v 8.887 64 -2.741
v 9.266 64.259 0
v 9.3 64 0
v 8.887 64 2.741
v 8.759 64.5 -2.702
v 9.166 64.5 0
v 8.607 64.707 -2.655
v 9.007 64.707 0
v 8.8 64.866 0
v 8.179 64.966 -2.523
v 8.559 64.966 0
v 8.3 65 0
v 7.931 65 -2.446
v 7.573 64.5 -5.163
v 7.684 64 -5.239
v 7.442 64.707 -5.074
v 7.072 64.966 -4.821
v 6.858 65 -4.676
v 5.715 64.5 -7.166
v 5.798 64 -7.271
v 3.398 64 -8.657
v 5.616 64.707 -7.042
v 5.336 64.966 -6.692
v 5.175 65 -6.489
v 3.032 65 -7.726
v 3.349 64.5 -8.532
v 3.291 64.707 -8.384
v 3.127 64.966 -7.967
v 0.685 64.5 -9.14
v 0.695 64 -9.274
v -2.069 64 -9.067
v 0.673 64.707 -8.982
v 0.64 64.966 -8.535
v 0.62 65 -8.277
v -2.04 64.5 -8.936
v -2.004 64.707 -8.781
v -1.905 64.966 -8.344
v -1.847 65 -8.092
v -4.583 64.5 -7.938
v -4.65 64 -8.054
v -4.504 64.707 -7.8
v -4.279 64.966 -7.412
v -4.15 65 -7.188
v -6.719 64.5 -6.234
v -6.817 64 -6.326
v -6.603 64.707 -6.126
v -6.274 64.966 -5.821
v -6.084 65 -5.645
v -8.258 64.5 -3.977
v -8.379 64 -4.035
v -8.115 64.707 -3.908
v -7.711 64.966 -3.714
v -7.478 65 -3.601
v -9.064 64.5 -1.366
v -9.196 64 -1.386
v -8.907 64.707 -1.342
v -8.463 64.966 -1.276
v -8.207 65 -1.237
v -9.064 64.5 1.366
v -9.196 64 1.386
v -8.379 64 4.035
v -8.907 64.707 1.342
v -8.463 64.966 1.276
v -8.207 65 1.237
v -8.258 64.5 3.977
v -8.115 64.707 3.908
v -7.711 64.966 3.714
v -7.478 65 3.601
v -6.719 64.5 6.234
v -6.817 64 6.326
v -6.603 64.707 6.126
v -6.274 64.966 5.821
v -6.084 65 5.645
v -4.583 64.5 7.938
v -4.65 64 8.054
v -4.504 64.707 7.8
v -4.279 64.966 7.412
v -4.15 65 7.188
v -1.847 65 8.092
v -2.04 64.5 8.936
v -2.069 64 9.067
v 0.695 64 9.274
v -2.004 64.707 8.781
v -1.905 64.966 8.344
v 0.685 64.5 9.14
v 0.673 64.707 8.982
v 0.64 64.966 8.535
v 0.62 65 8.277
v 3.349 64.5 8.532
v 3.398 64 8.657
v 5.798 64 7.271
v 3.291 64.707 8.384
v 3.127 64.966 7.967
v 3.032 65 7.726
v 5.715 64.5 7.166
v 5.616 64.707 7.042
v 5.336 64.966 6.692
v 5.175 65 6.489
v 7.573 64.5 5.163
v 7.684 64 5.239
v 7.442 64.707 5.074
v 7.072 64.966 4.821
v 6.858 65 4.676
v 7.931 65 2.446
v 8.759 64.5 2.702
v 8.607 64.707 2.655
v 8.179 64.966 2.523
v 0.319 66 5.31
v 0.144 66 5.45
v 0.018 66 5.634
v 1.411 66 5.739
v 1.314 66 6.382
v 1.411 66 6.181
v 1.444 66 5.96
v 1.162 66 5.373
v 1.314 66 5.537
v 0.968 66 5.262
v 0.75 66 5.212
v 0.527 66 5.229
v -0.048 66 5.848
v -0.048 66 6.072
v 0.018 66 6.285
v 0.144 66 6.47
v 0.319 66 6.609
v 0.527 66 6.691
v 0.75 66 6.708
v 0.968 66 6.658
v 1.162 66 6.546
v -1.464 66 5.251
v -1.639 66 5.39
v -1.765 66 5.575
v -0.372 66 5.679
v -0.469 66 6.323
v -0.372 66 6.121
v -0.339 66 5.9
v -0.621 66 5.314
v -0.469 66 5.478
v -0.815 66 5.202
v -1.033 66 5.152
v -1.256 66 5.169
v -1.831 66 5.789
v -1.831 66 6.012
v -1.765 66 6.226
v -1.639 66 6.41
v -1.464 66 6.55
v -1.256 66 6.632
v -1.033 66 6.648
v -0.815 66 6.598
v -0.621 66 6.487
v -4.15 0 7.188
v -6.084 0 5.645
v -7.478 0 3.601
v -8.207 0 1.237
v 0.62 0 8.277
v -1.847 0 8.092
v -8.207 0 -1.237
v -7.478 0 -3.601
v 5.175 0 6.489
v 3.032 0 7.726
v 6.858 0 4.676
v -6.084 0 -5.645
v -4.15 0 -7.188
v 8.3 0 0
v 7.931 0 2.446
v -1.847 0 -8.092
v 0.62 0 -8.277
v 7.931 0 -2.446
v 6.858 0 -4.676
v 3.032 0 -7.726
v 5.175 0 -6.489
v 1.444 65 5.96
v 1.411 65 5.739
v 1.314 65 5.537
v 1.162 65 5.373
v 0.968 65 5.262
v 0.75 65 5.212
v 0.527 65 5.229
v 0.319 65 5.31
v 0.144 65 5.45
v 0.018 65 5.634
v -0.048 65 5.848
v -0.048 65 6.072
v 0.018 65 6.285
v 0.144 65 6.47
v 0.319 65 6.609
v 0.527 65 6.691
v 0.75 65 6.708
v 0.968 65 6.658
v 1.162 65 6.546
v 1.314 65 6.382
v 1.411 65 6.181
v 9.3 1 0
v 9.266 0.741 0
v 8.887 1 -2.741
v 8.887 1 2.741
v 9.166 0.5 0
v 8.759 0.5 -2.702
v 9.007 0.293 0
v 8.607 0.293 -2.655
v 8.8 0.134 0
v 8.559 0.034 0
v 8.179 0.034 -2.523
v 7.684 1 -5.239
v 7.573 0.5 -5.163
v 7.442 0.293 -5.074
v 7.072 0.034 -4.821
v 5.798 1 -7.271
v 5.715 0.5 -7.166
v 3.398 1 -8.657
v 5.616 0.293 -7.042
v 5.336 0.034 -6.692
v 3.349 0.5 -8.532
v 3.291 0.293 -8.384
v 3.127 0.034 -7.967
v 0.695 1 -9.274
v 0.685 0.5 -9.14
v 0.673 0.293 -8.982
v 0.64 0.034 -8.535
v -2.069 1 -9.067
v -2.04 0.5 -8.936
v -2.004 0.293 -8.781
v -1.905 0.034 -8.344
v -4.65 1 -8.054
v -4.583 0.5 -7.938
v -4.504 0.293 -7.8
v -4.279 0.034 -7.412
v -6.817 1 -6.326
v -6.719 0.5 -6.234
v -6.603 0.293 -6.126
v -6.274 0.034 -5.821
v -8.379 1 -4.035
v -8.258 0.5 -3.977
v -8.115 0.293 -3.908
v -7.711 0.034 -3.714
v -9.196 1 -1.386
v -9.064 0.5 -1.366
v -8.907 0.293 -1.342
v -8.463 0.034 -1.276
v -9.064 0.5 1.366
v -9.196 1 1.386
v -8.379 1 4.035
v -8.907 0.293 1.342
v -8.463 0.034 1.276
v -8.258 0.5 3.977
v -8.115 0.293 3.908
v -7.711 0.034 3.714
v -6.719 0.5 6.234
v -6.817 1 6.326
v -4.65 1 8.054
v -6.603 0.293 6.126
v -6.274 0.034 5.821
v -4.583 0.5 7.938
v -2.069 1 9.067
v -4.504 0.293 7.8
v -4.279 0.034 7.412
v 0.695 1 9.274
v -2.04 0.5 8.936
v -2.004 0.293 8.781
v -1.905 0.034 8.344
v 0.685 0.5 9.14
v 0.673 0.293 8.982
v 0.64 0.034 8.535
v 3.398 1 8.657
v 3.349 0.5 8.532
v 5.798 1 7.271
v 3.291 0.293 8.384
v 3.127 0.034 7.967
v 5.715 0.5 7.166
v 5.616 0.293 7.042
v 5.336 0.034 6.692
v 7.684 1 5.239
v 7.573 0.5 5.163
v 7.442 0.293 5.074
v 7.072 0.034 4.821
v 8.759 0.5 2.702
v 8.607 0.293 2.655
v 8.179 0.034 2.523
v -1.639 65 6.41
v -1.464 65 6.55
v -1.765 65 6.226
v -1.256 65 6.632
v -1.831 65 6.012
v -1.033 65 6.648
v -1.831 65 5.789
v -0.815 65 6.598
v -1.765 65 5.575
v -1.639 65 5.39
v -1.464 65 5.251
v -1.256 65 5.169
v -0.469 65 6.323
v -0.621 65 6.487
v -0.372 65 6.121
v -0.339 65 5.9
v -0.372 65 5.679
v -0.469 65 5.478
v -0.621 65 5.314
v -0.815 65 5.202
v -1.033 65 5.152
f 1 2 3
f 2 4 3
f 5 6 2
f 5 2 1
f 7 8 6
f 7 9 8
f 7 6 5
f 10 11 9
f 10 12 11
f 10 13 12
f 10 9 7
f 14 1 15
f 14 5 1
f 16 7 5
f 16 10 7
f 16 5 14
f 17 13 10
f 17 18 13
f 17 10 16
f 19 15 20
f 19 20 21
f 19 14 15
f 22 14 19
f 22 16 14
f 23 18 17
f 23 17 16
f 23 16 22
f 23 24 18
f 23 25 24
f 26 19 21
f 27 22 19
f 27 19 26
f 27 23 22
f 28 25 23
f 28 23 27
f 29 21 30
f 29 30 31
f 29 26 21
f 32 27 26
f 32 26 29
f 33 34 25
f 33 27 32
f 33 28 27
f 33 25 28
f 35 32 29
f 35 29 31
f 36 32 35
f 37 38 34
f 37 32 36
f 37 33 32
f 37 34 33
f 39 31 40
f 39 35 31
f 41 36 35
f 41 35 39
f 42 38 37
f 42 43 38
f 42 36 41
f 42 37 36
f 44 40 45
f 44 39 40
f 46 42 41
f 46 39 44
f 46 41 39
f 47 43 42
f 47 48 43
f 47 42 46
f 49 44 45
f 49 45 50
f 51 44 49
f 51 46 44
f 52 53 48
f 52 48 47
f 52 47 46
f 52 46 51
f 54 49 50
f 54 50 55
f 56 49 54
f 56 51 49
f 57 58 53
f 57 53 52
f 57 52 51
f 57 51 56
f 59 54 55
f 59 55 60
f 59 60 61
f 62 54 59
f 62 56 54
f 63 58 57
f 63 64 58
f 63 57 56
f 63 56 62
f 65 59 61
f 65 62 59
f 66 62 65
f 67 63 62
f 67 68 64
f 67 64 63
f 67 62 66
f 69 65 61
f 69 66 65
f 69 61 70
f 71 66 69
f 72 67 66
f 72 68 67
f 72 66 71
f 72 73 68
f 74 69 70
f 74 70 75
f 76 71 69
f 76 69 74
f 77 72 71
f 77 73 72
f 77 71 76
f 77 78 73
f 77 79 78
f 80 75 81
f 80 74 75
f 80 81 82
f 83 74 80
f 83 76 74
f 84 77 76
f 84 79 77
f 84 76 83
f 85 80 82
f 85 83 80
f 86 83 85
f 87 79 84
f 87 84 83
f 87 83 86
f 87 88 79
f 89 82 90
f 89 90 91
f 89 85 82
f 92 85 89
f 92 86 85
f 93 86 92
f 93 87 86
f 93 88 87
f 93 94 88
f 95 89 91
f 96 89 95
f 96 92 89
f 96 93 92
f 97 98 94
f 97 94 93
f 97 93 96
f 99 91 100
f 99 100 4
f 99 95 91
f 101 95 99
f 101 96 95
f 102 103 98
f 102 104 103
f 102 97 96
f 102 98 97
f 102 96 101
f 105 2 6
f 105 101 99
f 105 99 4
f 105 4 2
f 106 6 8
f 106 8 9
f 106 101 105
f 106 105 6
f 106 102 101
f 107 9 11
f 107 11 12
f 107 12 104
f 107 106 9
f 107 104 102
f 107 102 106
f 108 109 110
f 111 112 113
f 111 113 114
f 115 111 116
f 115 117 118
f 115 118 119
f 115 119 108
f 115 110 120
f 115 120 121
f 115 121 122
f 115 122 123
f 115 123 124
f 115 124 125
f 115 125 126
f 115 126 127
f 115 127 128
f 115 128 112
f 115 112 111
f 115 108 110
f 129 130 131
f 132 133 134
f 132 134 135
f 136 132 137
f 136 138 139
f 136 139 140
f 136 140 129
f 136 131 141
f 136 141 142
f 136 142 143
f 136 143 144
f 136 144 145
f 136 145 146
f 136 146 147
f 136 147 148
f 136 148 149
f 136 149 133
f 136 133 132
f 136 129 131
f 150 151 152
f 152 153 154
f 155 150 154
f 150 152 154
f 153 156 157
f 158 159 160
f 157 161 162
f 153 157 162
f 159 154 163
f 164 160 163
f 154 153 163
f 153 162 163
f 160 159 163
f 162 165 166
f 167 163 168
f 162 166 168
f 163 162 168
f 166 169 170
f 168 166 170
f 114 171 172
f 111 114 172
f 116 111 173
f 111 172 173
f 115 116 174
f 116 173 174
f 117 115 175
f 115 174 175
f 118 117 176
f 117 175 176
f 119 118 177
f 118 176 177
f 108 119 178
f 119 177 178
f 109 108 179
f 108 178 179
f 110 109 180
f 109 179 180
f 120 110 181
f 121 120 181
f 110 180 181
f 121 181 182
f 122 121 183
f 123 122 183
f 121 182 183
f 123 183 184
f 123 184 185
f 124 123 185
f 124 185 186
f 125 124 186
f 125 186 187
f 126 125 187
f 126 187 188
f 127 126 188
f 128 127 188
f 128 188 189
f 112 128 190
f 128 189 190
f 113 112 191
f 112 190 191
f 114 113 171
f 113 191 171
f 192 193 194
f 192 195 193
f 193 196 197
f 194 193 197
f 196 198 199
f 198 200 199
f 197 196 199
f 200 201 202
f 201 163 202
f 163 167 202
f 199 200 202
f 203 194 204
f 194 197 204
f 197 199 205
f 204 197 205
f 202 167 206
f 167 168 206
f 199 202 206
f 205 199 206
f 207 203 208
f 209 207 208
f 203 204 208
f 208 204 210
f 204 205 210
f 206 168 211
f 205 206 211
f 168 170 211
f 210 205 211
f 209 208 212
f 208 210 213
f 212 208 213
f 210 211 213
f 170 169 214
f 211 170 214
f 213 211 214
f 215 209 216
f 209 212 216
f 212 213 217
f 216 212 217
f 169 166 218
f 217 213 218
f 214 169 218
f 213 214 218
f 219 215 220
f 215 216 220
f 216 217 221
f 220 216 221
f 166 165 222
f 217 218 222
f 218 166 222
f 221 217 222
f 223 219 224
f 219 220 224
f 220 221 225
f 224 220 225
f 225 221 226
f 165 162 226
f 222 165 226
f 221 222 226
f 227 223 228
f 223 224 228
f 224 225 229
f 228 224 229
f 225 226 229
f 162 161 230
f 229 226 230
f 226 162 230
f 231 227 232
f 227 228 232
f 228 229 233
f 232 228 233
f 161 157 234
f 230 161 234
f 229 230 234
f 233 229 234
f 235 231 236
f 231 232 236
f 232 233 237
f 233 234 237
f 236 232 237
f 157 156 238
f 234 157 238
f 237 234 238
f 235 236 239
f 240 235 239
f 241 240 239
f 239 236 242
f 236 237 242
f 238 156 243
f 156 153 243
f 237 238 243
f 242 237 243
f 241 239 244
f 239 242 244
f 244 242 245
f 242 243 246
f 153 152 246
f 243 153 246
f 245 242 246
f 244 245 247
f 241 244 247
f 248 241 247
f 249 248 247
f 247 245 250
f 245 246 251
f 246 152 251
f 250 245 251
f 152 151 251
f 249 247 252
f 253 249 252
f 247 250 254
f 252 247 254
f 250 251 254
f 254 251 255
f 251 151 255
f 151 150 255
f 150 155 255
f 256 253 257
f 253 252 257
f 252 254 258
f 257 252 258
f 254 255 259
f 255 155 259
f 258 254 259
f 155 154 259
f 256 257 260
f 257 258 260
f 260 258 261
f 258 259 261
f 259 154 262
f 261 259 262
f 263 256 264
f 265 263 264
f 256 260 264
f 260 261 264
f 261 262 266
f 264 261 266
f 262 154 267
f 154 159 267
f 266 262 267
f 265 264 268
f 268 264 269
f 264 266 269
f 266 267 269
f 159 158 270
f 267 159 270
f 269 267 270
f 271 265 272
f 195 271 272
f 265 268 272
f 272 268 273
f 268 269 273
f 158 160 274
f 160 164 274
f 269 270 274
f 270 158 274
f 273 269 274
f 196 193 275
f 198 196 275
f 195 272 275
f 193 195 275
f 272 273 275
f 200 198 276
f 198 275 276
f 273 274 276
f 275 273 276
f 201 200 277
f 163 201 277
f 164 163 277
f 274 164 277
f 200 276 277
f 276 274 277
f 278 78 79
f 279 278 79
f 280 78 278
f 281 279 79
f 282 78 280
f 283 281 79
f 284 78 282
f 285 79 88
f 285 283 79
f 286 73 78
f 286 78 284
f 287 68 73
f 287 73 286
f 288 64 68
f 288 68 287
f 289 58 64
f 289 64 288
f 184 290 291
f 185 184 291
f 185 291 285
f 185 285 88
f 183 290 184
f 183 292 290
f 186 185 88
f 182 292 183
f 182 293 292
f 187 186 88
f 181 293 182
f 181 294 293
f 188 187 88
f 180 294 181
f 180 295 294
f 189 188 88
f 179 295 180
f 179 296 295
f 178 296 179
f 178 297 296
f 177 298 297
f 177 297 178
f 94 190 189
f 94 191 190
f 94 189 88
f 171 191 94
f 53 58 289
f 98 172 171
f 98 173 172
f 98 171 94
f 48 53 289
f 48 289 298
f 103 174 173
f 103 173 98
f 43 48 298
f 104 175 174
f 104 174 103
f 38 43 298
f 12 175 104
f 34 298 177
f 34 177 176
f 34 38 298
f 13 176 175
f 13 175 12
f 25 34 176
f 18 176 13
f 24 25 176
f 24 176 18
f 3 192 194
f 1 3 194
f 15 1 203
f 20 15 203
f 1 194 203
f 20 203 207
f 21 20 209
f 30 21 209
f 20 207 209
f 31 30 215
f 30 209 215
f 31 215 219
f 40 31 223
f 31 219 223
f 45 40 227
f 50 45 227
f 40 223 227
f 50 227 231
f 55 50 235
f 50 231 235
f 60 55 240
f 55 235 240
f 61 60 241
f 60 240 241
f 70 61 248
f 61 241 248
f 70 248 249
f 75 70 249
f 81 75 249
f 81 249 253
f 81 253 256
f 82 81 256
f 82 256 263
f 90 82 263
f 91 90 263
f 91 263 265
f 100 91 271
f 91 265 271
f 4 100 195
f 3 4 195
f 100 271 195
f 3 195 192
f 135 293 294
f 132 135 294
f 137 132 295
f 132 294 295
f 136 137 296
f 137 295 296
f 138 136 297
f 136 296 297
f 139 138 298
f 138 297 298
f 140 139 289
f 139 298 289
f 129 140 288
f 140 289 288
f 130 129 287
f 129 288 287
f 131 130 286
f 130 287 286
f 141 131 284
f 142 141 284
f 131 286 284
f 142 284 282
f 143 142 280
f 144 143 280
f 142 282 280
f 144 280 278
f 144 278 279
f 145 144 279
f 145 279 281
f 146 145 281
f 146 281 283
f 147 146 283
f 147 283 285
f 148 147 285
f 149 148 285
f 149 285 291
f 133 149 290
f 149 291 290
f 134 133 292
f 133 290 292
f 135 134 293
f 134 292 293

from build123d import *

# Parameters (mm, degrees)
SKETCH1_R           = 9.3
BOSS_EXTRUDE1_DEPTH = 65
FILLET1_R           = 1
SKETCH2_R           = 0.75
BOSS_EXTRUDE2_DEPTH = 1


with BuildPart() as part:
    # Sketch1 → Boss-Extrude1 (new body)
    with BuildSketch(Plane(origin=(0, 0, 0), x_dir=(1, 0, 0), z_dir=(0, 1, 0))):
        Circle(SKETCH1_R)
    extrude(amount=BOSS_EXTRUDE1_DEPTH)

    # Fillet1
    fillet1_edges = [part.edges().sort_by_distance(p)[0] for p in [
        (-9.3, 0, 0),
        (-9.3, 65, 0),
    ]]
    fillet(fillet1_edges, radius=FILLET1_R)

    # Sketch2 → Boss-Extrude2 (add)
    with BuildSketch(Plane(origin=(0, 65, 0), x_dir=(1, 0, 0), z_dir=(0, 1, 0))):
        with Locations((-1.089057168, -5.900335116)):
            Circle(SKETCH2_R)
        with Locations((0.694041569, -5.959723676)):
            Circle(SKETCH2_R)
    extrude(amount=BOSS_EXTRUDE2_DEPTH)


solid = part.part
